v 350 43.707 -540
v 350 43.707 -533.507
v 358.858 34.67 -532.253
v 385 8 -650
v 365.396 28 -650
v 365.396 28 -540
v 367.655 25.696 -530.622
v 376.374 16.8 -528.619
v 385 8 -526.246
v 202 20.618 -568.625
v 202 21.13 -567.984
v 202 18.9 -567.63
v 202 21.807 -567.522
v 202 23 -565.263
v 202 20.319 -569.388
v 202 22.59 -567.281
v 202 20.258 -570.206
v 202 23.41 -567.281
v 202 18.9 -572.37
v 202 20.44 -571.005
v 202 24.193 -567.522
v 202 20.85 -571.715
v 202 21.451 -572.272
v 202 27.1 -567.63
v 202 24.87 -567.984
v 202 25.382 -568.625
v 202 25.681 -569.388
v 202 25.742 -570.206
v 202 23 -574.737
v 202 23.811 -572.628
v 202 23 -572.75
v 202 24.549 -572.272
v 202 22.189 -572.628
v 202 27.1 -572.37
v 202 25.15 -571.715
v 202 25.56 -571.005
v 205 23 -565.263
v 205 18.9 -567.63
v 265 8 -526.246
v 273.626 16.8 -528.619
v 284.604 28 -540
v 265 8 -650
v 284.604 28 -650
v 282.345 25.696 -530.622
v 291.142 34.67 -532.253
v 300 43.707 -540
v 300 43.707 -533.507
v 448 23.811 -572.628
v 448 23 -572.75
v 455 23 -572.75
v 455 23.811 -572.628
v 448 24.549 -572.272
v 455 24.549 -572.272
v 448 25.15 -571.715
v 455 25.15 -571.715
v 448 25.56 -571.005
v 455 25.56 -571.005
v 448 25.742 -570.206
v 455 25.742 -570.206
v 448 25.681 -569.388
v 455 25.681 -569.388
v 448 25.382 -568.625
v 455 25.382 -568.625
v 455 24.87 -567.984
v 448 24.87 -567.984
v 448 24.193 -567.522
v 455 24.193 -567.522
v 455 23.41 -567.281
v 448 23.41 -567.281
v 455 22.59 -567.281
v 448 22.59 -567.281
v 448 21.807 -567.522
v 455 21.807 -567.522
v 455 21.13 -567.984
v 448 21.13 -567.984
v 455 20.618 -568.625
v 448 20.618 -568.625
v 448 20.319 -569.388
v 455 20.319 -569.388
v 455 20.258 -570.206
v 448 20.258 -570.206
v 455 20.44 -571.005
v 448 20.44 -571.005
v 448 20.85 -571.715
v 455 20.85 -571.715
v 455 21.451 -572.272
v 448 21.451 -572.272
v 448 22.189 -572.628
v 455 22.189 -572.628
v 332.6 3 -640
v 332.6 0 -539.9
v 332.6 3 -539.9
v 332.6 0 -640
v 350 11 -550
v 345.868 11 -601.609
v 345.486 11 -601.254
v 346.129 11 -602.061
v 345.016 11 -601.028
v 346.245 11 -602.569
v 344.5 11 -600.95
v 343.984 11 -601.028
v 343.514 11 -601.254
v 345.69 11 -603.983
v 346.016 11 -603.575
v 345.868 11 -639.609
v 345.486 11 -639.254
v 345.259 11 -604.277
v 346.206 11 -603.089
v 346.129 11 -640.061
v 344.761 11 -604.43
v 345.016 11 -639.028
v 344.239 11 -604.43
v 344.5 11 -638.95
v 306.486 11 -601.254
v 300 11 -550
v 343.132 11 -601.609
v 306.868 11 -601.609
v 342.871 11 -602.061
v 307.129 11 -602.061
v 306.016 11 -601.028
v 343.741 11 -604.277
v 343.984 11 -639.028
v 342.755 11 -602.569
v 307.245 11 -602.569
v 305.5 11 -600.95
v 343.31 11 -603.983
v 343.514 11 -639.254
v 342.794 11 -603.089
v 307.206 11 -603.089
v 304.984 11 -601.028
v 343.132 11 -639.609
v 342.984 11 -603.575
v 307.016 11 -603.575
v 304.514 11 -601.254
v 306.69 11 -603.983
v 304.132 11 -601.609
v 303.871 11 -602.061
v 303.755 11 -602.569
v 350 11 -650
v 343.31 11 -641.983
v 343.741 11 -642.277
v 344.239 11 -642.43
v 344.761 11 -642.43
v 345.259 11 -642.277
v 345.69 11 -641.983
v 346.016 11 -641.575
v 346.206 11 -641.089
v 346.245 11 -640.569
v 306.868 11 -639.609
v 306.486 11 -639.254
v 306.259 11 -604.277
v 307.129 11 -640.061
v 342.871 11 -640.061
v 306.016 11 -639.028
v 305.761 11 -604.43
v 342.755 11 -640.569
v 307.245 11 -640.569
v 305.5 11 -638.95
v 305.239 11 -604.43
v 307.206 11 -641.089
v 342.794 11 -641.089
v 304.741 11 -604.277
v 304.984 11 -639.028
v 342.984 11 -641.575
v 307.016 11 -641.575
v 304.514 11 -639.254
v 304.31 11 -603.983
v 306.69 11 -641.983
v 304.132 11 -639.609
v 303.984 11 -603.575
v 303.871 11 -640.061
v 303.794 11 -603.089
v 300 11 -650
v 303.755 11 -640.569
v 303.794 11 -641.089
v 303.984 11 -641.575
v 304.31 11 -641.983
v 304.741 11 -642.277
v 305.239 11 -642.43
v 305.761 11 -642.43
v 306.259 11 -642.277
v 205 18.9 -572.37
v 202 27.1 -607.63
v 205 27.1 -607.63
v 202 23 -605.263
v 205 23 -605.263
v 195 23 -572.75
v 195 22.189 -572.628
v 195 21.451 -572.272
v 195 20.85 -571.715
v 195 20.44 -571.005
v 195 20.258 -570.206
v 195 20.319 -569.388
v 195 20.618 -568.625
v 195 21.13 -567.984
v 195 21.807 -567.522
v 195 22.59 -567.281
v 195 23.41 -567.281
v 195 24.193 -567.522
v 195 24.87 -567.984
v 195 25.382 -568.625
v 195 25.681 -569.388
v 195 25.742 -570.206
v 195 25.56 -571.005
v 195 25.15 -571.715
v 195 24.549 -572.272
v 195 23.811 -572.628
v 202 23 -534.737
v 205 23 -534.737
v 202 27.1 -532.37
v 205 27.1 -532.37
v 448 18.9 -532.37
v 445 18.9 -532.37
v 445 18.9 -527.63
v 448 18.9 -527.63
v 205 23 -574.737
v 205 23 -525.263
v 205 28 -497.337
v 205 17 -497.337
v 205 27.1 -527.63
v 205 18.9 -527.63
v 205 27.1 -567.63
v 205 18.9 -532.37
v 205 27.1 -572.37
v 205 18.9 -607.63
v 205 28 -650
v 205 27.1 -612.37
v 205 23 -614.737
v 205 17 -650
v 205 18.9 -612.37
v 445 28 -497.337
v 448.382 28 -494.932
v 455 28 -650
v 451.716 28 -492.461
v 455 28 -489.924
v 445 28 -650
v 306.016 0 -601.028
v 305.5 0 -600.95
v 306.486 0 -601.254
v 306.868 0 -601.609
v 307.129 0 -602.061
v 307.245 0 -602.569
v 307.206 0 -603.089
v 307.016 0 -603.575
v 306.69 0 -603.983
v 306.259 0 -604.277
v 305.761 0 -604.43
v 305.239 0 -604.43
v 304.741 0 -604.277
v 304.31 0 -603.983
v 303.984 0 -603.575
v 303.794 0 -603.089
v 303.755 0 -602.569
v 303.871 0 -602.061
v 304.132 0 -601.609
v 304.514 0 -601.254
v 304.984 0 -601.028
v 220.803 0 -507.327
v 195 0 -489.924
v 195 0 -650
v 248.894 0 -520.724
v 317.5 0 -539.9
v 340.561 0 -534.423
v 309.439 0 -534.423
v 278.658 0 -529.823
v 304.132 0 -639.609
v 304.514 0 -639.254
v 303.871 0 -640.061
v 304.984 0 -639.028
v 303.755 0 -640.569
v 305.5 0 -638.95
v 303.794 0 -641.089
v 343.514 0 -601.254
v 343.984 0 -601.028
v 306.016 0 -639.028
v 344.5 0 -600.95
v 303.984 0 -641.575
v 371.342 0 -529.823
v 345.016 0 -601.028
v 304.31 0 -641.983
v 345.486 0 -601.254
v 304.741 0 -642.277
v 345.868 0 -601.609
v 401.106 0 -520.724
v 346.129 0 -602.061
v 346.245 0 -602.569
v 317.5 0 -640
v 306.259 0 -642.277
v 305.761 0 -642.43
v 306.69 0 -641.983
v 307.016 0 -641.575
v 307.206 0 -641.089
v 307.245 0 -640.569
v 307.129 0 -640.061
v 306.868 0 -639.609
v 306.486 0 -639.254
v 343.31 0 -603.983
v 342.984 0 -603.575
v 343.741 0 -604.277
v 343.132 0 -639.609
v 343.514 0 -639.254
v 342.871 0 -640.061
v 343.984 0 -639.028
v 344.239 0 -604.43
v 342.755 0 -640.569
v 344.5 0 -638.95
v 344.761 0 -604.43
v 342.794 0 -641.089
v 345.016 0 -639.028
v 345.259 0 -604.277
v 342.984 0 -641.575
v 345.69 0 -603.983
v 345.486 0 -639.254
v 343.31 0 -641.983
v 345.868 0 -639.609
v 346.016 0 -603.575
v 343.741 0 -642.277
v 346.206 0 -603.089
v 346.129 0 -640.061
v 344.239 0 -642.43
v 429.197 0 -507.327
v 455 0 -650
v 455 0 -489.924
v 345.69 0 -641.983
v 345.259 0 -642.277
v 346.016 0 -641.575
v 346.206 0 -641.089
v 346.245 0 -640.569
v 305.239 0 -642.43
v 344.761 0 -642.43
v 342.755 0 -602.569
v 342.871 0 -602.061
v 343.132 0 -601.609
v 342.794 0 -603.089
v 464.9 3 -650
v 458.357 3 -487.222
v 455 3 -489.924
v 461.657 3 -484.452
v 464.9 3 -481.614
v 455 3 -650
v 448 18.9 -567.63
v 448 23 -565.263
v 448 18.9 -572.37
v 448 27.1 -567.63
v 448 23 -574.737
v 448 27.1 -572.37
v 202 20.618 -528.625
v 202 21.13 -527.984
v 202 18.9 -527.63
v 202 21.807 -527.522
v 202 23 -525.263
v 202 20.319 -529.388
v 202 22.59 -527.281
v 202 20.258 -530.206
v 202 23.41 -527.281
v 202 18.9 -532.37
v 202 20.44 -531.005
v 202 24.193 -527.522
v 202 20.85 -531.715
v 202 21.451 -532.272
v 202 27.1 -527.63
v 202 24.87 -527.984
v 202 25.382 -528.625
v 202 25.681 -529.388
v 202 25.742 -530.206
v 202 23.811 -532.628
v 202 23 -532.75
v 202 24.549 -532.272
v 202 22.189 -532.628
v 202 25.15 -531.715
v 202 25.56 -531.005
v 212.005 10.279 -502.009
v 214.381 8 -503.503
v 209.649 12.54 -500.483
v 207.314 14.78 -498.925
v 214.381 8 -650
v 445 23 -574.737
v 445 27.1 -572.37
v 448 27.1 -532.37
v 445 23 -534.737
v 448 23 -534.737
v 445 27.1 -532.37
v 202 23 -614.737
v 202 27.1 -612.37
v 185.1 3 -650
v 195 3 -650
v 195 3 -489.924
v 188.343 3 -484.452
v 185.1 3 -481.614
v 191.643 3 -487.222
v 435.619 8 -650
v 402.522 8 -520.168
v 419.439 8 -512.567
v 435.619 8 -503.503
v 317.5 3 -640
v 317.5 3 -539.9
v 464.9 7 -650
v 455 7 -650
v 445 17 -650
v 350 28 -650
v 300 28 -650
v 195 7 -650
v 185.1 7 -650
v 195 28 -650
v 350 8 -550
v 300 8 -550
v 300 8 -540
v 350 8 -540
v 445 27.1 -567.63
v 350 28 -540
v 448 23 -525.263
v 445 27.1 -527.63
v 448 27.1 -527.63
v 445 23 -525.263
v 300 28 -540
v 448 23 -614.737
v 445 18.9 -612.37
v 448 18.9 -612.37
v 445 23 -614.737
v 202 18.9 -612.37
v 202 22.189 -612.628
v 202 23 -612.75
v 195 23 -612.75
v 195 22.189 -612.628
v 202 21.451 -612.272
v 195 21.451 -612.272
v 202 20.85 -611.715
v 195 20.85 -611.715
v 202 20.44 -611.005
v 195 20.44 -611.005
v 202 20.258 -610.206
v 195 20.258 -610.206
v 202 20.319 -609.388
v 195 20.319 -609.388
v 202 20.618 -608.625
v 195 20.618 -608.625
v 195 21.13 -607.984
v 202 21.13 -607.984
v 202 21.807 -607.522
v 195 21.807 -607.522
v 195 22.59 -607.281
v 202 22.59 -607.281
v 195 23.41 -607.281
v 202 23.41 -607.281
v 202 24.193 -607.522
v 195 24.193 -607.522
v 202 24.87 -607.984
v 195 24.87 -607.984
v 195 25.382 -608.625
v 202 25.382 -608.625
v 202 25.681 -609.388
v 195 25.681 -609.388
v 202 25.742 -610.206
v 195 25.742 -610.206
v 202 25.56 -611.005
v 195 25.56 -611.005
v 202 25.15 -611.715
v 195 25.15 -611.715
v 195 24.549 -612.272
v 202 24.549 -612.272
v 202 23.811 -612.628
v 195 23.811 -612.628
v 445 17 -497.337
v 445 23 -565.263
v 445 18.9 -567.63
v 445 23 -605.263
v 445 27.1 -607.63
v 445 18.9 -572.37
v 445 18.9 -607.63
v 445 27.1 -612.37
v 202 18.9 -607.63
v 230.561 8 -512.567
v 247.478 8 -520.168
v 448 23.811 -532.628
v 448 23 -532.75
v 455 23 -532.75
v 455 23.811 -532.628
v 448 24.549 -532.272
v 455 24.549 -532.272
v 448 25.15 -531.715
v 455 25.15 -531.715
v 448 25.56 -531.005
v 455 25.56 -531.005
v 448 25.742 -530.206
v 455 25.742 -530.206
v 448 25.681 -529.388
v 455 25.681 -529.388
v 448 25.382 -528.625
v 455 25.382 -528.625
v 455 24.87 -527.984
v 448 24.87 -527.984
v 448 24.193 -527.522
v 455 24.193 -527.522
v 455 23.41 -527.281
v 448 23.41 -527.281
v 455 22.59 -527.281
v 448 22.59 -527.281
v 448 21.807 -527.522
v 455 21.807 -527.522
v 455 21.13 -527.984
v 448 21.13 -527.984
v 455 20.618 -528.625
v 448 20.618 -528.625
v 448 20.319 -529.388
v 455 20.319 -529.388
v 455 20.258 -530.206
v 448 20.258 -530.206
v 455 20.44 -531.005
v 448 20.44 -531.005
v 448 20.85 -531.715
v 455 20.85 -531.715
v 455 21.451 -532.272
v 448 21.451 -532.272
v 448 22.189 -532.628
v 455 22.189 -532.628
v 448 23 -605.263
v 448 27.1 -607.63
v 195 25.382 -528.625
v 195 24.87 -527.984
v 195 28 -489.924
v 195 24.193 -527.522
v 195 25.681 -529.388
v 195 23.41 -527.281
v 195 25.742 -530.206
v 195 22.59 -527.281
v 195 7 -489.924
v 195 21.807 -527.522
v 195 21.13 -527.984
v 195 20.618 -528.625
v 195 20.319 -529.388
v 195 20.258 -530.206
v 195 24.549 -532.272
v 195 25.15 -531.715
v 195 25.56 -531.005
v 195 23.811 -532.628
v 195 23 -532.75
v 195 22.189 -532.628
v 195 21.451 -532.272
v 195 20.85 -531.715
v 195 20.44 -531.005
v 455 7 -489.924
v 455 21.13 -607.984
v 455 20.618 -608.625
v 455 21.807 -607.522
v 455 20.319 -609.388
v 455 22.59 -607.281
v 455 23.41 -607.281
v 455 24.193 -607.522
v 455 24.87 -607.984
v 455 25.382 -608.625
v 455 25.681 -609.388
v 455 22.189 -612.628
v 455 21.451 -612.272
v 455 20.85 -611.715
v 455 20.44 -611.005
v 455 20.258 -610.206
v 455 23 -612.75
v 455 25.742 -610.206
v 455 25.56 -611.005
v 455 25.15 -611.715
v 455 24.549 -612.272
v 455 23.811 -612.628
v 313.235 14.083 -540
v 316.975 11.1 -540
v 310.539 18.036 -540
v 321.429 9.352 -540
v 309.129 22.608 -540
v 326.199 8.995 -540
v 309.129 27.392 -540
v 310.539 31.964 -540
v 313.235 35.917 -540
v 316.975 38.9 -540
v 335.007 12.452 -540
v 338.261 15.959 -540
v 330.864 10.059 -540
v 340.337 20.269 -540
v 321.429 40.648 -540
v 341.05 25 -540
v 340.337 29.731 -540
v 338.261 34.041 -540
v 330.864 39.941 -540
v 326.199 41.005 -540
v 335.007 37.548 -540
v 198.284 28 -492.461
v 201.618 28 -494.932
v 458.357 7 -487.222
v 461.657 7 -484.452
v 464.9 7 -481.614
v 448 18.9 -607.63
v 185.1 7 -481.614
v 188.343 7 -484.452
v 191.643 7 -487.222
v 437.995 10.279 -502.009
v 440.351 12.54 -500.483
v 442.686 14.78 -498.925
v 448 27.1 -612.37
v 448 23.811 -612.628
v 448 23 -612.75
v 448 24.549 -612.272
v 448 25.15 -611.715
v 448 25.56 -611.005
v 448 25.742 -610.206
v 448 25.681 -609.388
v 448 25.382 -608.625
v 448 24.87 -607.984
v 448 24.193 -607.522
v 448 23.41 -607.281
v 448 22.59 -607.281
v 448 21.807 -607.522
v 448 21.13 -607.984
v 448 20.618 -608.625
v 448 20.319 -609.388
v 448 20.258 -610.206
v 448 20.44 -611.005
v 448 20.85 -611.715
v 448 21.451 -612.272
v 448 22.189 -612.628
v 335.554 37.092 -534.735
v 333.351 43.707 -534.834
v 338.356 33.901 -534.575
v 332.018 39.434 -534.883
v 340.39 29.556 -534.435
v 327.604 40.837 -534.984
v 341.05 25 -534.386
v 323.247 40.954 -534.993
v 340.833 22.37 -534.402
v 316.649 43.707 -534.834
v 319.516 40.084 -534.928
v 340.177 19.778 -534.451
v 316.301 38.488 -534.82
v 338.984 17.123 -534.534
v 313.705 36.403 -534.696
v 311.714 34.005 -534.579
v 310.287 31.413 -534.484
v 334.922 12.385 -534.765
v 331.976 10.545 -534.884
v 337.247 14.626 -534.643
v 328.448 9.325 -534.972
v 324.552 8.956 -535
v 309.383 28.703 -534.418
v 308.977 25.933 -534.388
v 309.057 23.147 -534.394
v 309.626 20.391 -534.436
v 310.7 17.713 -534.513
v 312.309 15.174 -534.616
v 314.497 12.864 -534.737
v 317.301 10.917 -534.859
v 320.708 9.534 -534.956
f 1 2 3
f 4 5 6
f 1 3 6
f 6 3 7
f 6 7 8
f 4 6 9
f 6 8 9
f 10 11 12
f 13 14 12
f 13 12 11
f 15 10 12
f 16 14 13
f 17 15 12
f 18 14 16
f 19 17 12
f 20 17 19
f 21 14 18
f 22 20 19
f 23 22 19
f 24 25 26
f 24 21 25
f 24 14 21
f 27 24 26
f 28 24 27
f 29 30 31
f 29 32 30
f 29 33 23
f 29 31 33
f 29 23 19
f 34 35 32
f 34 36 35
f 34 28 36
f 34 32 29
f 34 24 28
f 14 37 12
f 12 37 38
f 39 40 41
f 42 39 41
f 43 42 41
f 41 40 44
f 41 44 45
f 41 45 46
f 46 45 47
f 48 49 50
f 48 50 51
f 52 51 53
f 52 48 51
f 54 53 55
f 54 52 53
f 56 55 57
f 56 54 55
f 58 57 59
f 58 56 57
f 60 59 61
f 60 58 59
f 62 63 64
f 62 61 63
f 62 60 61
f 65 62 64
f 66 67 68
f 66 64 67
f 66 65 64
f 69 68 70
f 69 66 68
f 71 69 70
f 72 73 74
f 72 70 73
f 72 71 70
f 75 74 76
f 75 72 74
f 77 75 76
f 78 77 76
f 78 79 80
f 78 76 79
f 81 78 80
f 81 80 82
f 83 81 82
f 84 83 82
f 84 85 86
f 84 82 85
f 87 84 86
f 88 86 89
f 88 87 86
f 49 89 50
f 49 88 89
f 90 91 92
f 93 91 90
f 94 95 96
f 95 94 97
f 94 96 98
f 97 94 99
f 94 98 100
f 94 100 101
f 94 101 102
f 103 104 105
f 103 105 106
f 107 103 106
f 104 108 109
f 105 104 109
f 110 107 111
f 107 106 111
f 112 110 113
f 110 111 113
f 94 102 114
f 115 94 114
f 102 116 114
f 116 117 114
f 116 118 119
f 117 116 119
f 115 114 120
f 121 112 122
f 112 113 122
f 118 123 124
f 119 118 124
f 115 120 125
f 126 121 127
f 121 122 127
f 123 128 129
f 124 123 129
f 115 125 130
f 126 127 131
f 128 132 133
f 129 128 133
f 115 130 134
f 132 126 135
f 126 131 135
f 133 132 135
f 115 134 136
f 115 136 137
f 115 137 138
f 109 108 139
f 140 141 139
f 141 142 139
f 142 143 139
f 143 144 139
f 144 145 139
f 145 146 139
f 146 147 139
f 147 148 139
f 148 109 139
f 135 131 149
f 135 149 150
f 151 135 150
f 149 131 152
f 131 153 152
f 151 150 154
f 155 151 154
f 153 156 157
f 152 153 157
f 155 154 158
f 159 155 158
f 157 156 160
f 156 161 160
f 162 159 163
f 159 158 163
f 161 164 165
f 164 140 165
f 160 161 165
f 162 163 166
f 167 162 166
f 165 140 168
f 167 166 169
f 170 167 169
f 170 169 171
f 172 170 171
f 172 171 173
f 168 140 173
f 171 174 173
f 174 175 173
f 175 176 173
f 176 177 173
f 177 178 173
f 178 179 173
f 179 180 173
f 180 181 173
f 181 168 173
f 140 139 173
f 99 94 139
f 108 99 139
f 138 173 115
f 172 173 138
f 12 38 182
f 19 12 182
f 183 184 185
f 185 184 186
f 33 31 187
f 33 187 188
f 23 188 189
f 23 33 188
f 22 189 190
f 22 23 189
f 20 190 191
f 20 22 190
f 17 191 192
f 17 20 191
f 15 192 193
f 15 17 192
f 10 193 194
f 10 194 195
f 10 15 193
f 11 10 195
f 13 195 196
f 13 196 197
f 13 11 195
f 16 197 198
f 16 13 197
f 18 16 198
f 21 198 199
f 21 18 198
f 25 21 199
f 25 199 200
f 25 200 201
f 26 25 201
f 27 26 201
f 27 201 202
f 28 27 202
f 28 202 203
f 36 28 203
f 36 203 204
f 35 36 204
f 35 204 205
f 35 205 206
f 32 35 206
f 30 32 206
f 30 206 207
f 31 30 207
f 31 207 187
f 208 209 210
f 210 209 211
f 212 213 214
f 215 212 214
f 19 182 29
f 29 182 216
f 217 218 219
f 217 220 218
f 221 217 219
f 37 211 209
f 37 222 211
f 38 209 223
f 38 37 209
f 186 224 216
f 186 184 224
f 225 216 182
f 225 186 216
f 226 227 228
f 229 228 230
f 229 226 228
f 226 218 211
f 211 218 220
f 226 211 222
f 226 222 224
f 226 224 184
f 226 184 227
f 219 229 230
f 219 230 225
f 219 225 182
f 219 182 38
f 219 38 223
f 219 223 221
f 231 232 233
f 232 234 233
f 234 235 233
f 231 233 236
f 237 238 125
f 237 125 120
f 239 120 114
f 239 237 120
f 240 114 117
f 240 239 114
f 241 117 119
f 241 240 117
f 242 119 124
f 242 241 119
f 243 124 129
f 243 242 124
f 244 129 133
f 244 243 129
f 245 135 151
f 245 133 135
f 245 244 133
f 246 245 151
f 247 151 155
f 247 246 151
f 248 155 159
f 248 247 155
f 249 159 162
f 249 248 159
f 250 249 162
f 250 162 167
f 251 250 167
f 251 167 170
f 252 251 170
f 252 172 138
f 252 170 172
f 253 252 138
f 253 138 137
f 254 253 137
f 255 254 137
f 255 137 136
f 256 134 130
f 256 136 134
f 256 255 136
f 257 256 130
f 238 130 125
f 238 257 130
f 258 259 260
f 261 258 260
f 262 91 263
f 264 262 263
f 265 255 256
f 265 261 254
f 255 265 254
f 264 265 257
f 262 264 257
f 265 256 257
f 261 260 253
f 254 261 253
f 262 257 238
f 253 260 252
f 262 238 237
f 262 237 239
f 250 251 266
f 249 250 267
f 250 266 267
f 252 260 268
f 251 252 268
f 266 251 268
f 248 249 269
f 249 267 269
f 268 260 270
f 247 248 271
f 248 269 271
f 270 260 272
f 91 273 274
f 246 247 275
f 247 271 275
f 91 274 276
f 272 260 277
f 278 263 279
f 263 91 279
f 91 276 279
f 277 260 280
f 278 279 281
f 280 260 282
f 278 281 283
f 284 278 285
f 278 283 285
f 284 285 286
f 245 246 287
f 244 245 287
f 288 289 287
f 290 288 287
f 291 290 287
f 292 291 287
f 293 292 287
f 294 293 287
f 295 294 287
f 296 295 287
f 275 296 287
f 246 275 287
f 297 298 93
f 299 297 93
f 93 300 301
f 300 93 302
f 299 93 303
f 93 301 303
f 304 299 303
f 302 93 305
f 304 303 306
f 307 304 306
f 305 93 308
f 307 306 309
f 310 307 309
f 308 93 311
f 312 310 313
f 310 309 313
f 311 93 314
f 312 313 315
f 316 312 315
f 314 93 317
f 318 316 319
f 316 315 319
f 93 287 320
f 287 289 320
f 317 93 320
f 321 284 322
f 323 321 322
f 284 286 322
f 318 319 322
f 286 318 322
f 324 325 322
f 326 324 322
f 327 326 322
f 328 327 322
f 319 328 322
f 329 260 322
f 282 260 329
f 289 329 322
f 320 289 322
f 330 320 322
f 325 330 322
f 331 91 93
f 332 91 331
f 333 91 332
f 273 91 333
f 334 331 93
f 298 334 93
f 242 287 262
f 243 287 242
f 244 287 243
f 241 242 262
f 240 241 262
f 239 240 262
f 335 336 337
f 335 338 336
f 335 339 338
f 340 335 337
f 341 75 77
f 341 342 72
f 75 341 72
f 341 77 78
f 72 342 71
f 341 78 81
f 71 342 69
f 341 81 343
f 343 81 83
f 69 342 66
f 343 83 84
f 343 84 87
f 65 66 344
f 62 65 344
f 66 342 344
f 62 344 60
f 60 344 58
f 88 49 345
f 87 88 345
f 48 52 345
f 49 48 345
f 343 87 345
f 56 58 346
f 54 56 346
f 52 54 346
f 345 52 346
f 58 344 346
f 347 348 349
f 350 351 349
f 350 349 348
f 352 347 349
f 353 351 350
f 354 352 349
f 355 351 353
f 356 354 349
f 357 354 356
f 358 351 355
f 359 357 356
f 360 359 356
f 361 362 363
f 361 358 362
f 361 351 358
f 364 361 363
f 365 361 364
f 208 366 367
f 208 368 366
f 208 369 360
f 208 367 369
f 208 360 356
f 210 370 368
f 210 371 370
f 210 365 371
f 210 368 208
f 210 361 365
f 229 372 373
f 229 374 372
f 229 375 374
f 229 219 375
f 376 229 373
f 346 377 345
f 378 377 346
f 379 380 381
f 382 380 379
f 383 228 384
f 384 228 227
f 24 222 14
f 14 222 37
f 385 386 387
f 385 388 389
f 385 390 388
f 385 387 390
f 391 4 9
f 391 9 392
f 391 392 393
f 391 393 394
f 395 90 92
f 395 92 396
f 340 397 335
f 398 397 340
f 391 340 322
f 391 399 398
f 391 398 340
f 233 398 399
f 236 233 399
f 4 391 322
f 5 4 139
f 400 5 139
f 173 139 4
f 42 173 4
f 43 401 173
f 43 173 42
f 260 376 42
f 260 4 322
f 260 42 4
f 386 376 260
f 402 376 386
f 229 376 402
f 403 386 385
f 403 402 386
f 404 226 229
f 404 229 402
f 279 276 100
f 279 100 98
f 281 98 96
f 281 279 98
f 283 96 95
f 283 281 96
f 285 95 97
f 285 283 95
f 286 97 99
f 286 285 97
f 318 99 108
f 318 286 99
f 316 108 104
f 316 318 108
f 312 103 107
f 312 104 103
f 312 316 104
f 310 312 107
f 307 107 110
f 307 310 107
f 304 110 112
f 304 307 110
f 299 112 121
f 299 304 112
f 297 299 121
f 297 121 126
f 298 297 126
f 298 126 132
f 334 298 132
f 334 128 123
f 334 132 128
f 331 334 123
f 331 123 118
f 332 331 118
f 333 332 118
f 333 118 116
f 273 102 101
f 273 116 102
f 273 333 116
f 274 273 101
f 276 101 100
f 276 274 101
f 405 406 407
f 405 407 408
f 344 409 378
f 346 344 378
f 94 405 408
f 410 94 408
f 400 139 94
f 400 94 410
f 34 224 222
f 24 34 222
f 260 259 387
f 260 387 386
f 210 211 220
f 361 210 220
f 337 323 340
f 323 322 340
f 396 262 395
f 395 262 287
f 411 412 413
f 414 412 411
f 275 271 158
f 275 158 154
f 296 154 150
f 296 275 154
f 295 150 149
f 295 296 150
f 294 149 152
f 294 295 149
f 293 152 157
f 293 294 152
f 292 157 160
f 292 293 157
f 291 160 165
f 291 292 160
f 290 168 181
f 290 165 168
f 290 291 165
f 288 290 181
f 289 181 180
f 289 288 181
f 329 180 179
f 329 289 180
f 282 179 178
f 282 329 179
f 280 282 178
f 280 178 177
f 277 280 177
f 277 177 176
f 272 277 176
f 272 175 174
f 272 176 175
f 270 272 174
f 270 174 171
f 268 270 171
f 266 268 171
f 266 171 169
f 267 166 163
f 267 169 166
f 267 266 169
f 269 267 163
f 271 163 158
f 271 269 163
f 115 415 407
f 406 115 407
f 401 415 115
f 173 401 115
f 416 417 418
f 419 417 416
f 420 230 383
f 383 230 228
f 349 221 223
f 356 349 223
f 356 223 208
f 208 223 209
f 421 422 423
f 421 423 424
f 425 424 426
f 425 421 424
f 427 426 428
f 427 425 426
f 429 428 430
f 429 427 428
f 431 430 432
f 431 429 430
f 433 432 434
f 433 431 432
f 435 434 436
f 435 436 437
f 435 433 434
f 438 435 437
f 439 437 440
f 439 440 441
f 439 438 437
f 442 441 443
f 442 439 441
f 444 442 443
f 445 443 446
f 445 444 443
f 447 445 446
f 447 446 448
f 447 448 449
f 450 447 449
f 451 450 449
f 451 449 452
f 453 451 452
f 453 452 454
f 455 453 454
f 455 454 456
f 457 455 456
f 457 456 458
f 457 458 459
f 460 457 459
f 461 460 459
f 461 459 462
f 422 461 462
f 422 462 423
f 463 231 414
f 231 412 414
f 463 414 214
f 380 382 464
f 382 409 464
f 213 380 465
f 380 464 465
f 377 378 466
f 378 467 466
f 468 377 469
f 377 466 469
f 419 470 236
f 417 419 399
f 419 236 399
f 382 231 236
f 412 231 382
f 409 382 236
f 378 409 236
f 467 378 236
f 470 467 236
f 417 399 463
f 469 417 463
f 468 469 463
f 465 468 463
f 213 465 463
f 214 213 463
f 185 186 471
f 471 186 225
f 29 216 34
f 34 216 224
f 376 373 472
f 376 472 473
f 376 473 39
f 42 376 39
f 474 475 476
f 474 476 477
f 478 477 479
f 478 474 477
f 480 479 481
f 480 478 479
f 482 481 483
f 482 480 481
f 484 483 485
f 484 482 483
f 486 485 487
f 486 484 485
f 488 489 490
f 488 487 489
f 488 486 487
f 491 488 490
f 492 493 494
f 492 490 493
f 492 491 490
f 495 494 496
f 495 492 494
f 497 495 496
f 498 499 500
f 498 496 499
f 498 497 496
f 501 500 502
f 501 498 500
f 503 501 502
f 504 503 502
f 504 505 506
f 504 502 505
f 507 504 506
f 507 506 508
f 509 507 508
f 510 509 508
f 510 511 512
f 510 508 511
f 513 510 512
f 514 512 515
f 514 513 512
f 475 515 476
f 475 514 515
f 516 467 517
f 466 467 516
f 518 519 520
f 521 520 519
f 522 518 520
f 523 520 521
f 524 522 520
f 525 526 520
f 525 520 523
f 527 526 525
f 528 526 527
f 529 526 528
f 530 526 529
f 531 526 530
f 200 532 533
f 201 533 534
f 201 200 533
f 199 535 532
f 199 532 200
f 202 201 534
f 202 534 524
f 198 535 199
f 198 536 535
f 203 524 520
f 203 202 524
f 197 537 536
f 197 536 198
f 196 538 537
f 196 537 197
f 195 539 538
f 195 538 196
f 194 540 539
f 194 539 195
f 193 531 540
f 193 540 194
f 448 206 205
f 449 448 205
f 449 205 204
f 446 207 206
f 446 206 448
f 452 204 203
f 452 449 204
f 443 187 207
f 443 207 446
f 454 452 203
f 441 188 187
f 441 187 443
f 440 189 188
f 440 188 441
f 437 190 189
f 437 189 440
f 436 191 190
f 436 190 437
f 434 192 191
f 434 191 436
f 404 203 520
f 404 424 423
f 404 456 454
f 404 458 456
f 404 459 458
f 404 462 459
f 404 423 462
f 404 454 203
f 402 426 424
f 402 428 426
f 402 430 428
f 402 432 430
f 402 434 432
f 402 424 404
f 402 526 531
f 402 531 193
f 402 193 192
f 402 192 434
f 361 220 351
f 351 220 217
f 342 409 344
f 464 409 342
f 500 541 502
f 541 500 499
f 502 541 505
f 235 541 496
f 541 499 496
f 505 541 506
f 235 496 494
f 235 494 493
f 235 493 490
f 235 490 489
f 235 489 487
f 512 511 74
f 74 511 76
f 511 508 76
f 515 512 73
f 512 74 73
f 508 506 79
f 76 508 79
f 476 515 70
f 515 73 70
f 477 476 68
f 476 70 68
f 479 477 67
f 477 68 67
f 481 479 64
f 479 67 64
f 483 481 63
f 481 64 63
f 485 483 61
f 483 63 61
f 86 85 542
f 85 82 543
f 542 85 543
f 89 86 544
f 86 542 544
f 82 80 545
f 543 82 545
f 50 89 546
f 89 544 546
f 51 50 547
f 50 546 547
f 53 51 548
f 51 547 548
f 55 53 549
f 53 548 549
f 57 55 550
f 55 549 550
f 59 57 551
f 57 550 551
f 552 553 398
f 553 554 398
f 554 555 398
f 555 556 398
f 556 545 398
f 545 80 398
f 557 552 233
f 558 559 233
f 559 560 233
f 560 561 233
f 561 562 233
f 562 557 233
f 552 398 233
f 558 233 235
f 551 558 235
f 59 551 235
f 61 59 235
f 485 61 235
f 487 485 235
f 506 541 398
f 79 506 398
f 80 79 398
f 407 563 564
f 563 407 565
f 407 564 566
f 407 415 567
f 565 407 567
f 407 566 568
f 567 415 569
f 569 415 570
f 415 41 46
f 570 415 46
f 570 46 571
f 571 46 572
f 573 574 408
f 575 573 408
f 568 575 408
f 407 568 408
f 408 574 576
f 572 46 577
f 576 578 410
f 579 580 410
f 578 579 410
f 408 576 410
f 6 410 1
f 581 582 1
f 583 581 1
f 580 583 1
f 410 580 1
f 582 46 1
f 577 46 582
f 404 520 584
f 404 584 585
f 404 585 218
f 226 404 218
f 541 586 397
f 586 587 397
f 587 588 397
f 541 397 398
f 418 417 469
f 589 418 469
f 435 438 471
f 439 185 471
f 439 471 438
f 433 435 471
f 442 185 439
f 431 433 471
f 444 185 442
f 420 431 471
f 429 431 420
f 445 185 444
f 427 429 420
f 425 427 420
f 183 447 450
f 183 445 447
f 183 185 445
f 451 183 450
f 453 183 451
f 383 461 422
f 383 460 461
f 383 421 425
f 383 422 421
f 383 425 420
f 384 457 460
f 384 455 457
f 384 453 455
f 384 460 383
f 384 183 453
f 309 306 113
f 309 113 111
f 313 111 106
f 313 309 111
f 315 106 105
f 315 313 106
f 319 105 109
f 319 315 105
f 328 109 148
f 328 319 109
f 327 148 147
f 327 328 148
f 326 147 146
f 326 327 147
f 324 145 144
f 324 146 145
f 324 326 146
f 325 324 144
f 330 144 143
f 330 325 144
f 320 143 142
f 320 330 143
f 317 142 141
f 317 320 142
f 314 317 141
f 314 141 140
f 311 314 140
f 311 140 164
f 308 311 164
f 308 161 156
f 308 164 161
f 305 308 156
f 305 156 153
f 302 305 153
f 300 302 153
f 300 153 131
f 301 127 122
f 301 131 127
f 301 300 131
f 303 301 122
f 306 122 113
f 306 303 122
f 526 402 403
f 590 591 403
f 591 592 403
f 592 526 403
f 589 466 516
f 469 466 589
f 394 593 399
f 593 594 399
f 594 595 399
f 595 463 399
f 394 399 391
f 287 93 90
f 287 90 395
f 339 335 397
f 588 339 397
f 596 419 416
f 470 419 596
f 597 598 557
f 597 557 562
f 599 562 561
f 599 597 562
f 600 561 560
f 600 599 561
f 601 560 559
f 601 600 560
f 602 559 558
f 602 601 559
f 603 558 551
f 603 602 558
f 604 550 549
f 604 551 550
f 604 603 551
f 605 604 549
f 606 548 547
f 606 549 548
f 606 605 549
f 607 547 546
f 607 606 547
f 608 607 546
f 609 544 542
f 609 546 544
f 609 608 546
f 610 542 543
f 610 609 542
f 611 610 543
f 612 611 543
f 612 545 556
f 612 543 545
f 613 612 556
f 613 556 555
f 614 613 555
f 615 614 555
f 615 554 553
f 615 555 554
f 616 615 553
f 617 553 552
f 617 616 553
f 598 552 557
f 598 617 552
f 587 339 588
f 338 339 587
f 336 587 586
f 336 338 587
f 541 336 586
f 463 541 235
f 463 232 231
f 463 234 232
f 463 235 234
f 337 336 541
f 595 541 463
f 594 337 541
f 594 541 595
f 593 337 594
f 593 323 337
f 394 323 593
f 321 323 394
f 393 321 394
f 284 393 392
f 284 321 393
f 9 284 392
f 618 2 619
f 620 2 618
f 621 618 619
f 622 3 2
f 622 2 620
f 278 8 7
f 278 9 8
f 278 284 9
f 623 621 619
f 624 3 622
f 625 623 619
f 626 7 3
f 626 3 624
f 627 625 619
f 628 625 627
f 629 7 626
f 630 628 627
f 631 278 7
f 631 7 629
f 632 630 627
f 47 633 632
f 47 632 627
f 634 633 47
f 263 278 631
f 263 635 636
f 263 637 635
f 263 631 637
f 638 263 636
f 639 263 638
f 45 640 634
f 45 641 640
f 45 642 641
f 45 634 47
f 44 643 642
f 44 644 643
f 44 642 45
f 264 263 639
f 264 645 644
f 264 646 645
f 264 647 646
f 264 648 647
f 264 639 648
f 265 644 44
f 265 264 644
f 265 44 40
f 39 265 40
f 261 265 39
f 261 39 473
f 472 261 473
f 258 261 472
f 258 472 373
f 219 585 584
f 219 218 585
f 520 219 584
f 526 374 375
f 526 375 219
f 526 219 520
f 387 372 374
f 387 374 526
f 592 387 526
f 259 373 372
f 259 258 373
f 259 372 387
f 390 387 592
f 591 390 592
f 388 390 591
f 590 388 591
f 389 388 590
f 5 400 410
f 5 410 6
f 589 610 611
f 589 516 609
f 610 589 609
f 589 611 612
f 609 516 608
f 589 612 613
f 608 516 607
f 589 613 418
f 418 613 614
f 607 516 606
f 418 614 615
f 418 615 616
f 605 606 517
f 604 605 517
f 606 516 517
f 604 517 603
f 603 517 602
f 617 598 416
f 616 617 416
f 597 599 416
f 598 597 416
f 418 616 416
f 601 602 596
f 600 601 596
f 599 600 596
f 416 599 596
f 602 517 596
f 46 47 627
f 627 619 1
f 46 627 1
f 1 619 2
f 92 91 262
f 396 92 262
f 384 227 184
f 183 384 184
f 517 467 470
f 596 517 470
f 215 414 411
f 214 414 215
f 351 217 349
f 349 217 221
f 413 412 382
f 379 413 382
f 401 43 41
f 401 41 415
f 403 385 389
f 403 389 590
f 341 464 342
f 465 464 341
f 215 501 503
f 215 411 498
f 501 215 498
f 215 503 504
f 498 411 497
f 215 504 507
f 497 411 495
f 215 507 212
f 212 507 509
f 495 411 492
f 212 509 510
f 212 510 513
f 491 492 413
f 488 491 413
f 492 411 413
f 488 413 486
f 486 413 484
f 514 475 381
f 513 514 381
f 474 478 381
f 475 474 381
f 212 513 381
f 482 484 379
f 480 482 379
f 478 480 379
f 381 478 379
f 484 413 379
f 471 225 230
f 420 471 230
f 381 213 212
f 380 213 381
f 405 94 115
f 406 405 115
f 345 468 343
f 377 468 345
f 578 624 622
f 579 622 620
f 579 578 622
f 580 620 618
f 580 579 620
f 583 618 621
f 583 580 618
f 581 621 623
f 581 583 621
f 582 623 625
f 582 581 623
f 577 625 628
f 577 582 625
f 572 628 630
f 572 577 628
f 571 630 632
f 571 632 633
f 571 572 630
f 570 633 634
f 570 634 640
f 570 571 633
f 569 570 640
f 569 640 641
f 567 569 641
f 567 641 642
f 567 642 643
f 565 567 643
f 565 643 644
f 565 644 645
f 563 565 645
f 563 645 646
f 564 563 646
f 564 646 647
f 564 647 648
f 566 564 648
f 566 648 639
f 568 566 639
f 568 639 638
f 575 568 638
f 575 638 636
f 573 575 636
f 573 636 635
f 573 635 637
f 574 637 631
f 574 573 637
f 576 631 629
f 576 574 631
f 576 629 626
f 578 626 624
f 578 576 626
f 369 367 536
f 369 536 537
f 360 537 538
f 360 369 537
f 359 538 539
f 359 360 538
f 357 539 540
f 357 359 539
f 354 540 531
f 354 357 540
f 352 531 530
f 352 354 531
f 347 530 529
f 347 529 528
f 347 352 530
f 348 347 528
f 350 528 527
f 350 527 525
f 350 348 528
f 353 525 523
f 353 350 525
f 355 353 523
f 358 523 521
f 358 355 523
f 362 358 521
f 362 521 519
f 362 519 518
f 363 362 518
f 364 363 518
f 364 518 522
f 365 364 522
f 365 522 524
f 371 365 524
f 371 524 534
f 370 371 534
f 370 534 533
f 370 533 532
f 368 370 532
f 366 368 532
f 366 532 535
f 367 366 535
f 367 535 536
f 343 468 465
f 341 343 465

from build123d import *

# Parameters (mm, degrees)
SKETCH1_W               = 650
SKETCH1_H               = 650
BOSS_EXTRUDE1_DEPTH     = 8
BOSS_EXTRUDE2_DEPTH     = 650
CUT_EXTRUDE2_DEPTH      = 921.277302922
CUT_EXTRUDE2_DEPTH_BACK = 921.277302922
SKETCH4_R               = 16.05
CUT_EXTRUDE1_DEPTH      = 920.932062709
CUT_EXTRUDE1_DEPTH_BACK = 920.932062709
SKETCH2_R               = 210
CUT_EXTRUDE3_DEPTH      = 921.277302998
CUT_EXTRUDE3_DEPTH_BACK = 110
CUT_EXTRUDE4_DEPTH      = 110
CUT_EXTRUDE5_DEPTH      = 920.932062713
CUT_EXTRUDE5_DEPTH_BACK = 920.932062713
SKETCH7_OUTSIDE_W       = 836.056
SKETCH7_OUTSIDE_H       = 836.056
SKETCH7_OUTSIDE_W_2     = 260
SKETCH7_OUTSIDE_H_2     = 231.544504505
BOSS_EXTRUDE3_DEPTH     = 170
SKETCH9_W               = 9.9
SKETCH9_H               = 4
BOSS_EXTRUDE4_DEPTH     = 170
CUT_EXTRUDE6_DEPTH      = 800.941879143
CUT_EXTRUDE6_DEPTH_BACK = 800.941879143
SKETCH10_R              = 210
SKETCH11_W              = 50
SKETCH11_H              = 3
BOSS_EXTRUDE5_DEPTH     = 100
CUT_EXTRUDE7_DEPTH      = 800.81358281
CUT_EXTRUDE7_DEPTH_BACK = 800.81358281
SKETCH12_R              = 1.75
CUT_EXTRUDE8_DEPTH      = 706.164040729
CUT_EXTRUDE8_DEPTH_BACK = 10
SKETCH13_R              = 2.75
CUT_EXTRUDE9_START      = -10
SKETCH14_R              = 2.75
CUT_EXTRUDE9_DEPTH      = 10
CUT_EXTRUDE10_DEPTH     = 3
LPATTERN1_COUNT         = 3
LPATTERN1_PITCH         = 40
CUT_EXTRUDE11_DEPTH     = 3
LPATTERN2_COUNT         = 3
LPATTERN2_PITCH         = 40
SKETCH17_W              = 15.1
SKETCH17_H              = 100.1
CUT_EXTRUDE12_DEPTH     = 3


with BuildPart() as part:
    # Sketch1 → Boss-Extrude1 (new body)
    with BuildSketch(Plane(origin=(0, 0, 0), x_dir=(1, 0, 0), z_dir=(0, 1, 0))):
        with Locations((325, 325)):
            Rectangle(SKETCH1_W, SKETCH1_H)
    extrude(amount=BOSS_EXTRUDE1_DEPTH)

    # Sketch3 → Boss-Extrude2 (add)
    with BuildSketch(Plane.XY):
        Polygon((300, 43.707142143), (350, 43.707142143), (385, 8), (265, 8), align=None)
    extrude(amount=-BOSS_EXTRUDE2_DEPTH)

    # Sketch4 → Cut-Extrude2 (cut, two sides: drawn at the far end of the back side and taken through both)
    with BuildSketch(Plane.XY.offset(-CUT_EXTRUDE2_DEPTH_BACK)):
        with Locations((325, 25)):
            Circle(SKETCH4_R)
    extrude(amount=CUT_EXTRUDE2_DEPTH + CUT_EXTRUDE2_DEPTH_BACK, mode=Mode.SUBTRACT)

    # Sketch2 → Cut-Extrude1 (cut, two sides: drawn at the far end of the back side and taken through both)
    with BuildSketch(Plane(origin=(0, 8, 0), x_dir=(1, 0, 0), z_dir=(0, 1, 0)).offset(-CUT_EXTRUDE1_DEPTH_BACK)):
        with Locations(Location((325, 325, 0), (0, 0, 270))):
            Circle(SKETCH2_R)
    extrude(amount=CUT_EXTRUDE1_DEPTH + CUT_EXTRUDE1_DEPTH_BACK, mode=Mode.SUBTRACT)

    # Sketch5 → Cut-Extrude3 (cut, two sides: drawn at the far end of the back side and taken through both)
    with BuildSketch(Plane.XY.offset(-CUT_EXTRUDE3_DEPTH_BACK)):
        Polygon((300, 43.707142143), (350, 43.707142143), (365.396078824, 28), (350, 28), (350, 8), (300, 8), (300, 28), (284.603921176, 28), align=None)
    extrude(amount=CUT_EXTRUDE3_DEPTH + CUT_EXTRUDE3_DEPTH_BACK, mode=Mode.SUBTRACT)

    # Sketch6 → Cut-Extrude4 (cut)
    with BuildSketch(Plane(origin=(0, 0, -650), x_dir=(-1, 0, 0), z_dir=(0, 0, -1))):
        Polygon((-350, 43.707142143), (-300, 43.707142143), (-284.603921176, 28), (-300, 28), (-300, 8), (-350, 8), (-350, 28), (-365.396078824, 28), align=None)
    extrude(amount=-CUT_EXTRUDE4_DEPTH, mode=Mode.SUBTRACT)

    # Sketch7 outside → Cut-Extrude5 (cut, two sides: drawn at the far end of the back side and taken through both)
    with BuildSketch(Plane(origin=(0, 8, 0), x_dir=(1, 0, 0), z_dir=(0, 1, 0)).offset(-CUT_EXTRUDE5_DEPTH_BACK)):
        with Locations((325, 325)):
            Rectangle(SKETCH7_OUTSIDE_W, SKETCH7_OUTSIDE_H)
        with Locations((325, 570.772252253)):
            Rectangle(SKETCH7_OUTSIDE_W_2, SKETCH7_OUTSIDE_H_2, mode=Mode.SUBTRACT)
    extrude(amount=CUT_EXTRUDE5_DEPTH + CUT_EXTRUDE5_DEPTH_BACK, mode=Mode.SUBTRACT)

    # Sketch8 → Boss-Extrude3 (add)
    with BuildSketch(Plane(origin=(0, 0, -650), x_dir=(-1, 0, 0), z_dir=(0, 0, -1))):
        Polygon((-455, 8), (-455, 28), (-445, 28), (-445, 17), (-435.61916848, 8), align=None)
        Polygon((-195, 8), (-195, 28), (-205, 28), (-205, 17), (-214.38083152, 8), align=None)
    extrude(amount=-BOSS_EXTRUDE3_DEPTH)

    # Sketch9 → Boss-Extrude4 (add)
    with BuildSketch(Plane(origin=(0, 0, -650), x_dir=(-1, 0, 0), z_dir=(0, 0, -1))):
        with Locations((-459.95, 5)):
            Rectangle(SKETCH9_W, SKETCH9_H)
        with Locations((-190.05, 5)):
            Rectangle(SKETCH9_W, SKETCH9_H)
    extrude(amount=-BOSS_EXTRUDE4_DEPTH)

    # Sketch10 → Cut-Extrude6 (cut, two sides: drawn at the far end of the back side and taken through both)
    with BuildSketch(Plane(origin=(0, 8, 0), x_dir=(1, 0, 0), z_dir=(0, 1, 0)).offset(-CUT_EXTRUDE6_DEPTH_BACK)):
        with Locations((325, 325)):
            Circle(SKETCH10_R)
    extrude(amount=CUT_EXTRUDE6_DEPTH + CUT_EXTRUDE6_DEPTH_BACK, mode=Mode.SUBTRACT)

    # Sketch11 → Boss-Extrude5 (add)
    with BuildSketch(Plane(origin=(0, 0, -650), x_dir=(-1, 0, 0), z_dir=(0, 0, -1))):
        with Locations((-325, 9.5)):
            Rectangle(SKETCH11_W, SKETCH11_H)
    extrude(amount=-BOSS_EXTRUDE5_DEPTH)

    # Sketch12 → Cut-Extrude7 (cut, two sides: drawn at the far end of the back side and taken through both)
    with BuildSketch(Plane(origin=(0, 11, 0), x_dir=(1, 0, 0), z_dir=(0, 1, 0)).offset(-CUT_EXTRUDE7_DEPTH_BACK)):
        with Locations(Location((305.5, 640.7, 0), (0, 0, 270))):
            Circle(SKETCH12_R)
        with Locations(Location((344.5, 640.7, 0), (0, 0, 270))):
            Circle(SKETCH12_R)
        with Locations(Location((344.5, 602.7, 0), (0, 0, 270))):
            Circle(SKETCH12_R)
        with Locations(Location((305.5, 602.7, 0), (0, 0, 270))):
            Circle(SKETCH12_R)
    extrude(amount=CUT_EXTRUDE7_DEPTH + CUT_EXTRUDE7_DEPTH_BACK, mode=Mode.SUBTRACT)

    # Sketch13 → Cut-Extrude8 (cut, two sides: drawn at the far end of the back side and taken through both)
    with BuildSketch(Plane(origin=(455, 0, 0), x_dir=(0, 0, -1), z_dir=(1, 0, 0)).offset(-CUT_EXTRUDE8_DEPTH_BACK)):
        with Locations((610, 23)):
            Circle(SKETCH13_R)
        with Locations((570, 23)):
            Circle(SKETCH13_R)
        with Locations((530, 23)):
            Circle(SKETCH13_R)
    extrude(amount=CUT_EXTRUDE8_DEPTH + CUT_EXTRUDE8_DEPTH_BACK, mode=Mode.SUBTRACT)

    # Sketch14 → Cut-Extrude9 (cut)
    with BuildSketch(Plane.ZY.offset(-195).offset(CUT_EXTRUDE9_START)):
        with Locations(Location((-610, 23, 0), (0, 0, 180))):
            Circle(SKETCH14_R)
        with Locations(Location((-570, 23, 0), (0, 0, 180))):
            Circle(SKETCH14_R)
        with Locations(Location((-530, 23, 0), (0, 0, 180))):
            Circle(SKETCH14_R)
    extrude(amount=CUT_EXTRUDE9_DEPTH, mode=Mode.SUBTRACT)

    # Sketch15 → Cut-Extrude10 (cut)
    with BuildSketch(Plane(origin=(205, 0, 0), x_dir=(0, 0, -1), z_dir=(1, 0, 0))):
        Polygon((530, 27.1), (527.63, 27.1), (525.262863896, 23), (527.63, 18.9), (530, 18.9), (532.37, 18.9), (534.737136104, 23), (532.37, 27.1), align=None)
    cut_extrude10 = extrude(amount=-CUT_EXTRUDE10_DEPTH, mode=Mode.SUBTRACT)

    # LPattern1: Cut-Extrude10 ×3
    with Locations(*[(0, 0, -i * LPATTERN1_PITCH) for i in range(1, LPATTERN1_COUNT)]):
        add(cut_extrude10, mode=Mode.SUBTRACT)

    # Sketch16 → Cut-Extrude11 (cut)
    with BuildSketch(Plane.ZY.offset(-445)):
        Polygon((-610, 27.1), (-607.63, 27.1), (-605.262863896, 23), (-607.63, 18.9), (-610, 18.9), (-612.37, 18.9), (-614.737136104, 23), (-612.37, 27.1), align=None)
    cut_extrude11 = extrude(amount=-CUT_EXTRUDE11_DEPTH, mode=Mode.SUBTRACT)

    # LPattern2: Cut-Extrude11 ×3
    with Locations(*[(0, 0, i * LPATTERN2_PITCH) for i in range(1, LPATTERN2_COUNT)]):
        add(cut_extrude11, mode=Mode.SUBTRACT)

    # Sketch17 → Cut-Extrude12 (cut)
    with BuildSketch(Plane(origin=(0, 0, 0), x_dir=(-1, 0, 0), z_dir=(0, -1, 0))):
        with Locations((-325.05, 589.95)):
            Rectangle(SKETCH17_W, SKETCH17_H)
    extrude(amount=-CUT_EXTRUDE12_DEPTH, mode=Mode.SUBTRACT)


solid = part.part
